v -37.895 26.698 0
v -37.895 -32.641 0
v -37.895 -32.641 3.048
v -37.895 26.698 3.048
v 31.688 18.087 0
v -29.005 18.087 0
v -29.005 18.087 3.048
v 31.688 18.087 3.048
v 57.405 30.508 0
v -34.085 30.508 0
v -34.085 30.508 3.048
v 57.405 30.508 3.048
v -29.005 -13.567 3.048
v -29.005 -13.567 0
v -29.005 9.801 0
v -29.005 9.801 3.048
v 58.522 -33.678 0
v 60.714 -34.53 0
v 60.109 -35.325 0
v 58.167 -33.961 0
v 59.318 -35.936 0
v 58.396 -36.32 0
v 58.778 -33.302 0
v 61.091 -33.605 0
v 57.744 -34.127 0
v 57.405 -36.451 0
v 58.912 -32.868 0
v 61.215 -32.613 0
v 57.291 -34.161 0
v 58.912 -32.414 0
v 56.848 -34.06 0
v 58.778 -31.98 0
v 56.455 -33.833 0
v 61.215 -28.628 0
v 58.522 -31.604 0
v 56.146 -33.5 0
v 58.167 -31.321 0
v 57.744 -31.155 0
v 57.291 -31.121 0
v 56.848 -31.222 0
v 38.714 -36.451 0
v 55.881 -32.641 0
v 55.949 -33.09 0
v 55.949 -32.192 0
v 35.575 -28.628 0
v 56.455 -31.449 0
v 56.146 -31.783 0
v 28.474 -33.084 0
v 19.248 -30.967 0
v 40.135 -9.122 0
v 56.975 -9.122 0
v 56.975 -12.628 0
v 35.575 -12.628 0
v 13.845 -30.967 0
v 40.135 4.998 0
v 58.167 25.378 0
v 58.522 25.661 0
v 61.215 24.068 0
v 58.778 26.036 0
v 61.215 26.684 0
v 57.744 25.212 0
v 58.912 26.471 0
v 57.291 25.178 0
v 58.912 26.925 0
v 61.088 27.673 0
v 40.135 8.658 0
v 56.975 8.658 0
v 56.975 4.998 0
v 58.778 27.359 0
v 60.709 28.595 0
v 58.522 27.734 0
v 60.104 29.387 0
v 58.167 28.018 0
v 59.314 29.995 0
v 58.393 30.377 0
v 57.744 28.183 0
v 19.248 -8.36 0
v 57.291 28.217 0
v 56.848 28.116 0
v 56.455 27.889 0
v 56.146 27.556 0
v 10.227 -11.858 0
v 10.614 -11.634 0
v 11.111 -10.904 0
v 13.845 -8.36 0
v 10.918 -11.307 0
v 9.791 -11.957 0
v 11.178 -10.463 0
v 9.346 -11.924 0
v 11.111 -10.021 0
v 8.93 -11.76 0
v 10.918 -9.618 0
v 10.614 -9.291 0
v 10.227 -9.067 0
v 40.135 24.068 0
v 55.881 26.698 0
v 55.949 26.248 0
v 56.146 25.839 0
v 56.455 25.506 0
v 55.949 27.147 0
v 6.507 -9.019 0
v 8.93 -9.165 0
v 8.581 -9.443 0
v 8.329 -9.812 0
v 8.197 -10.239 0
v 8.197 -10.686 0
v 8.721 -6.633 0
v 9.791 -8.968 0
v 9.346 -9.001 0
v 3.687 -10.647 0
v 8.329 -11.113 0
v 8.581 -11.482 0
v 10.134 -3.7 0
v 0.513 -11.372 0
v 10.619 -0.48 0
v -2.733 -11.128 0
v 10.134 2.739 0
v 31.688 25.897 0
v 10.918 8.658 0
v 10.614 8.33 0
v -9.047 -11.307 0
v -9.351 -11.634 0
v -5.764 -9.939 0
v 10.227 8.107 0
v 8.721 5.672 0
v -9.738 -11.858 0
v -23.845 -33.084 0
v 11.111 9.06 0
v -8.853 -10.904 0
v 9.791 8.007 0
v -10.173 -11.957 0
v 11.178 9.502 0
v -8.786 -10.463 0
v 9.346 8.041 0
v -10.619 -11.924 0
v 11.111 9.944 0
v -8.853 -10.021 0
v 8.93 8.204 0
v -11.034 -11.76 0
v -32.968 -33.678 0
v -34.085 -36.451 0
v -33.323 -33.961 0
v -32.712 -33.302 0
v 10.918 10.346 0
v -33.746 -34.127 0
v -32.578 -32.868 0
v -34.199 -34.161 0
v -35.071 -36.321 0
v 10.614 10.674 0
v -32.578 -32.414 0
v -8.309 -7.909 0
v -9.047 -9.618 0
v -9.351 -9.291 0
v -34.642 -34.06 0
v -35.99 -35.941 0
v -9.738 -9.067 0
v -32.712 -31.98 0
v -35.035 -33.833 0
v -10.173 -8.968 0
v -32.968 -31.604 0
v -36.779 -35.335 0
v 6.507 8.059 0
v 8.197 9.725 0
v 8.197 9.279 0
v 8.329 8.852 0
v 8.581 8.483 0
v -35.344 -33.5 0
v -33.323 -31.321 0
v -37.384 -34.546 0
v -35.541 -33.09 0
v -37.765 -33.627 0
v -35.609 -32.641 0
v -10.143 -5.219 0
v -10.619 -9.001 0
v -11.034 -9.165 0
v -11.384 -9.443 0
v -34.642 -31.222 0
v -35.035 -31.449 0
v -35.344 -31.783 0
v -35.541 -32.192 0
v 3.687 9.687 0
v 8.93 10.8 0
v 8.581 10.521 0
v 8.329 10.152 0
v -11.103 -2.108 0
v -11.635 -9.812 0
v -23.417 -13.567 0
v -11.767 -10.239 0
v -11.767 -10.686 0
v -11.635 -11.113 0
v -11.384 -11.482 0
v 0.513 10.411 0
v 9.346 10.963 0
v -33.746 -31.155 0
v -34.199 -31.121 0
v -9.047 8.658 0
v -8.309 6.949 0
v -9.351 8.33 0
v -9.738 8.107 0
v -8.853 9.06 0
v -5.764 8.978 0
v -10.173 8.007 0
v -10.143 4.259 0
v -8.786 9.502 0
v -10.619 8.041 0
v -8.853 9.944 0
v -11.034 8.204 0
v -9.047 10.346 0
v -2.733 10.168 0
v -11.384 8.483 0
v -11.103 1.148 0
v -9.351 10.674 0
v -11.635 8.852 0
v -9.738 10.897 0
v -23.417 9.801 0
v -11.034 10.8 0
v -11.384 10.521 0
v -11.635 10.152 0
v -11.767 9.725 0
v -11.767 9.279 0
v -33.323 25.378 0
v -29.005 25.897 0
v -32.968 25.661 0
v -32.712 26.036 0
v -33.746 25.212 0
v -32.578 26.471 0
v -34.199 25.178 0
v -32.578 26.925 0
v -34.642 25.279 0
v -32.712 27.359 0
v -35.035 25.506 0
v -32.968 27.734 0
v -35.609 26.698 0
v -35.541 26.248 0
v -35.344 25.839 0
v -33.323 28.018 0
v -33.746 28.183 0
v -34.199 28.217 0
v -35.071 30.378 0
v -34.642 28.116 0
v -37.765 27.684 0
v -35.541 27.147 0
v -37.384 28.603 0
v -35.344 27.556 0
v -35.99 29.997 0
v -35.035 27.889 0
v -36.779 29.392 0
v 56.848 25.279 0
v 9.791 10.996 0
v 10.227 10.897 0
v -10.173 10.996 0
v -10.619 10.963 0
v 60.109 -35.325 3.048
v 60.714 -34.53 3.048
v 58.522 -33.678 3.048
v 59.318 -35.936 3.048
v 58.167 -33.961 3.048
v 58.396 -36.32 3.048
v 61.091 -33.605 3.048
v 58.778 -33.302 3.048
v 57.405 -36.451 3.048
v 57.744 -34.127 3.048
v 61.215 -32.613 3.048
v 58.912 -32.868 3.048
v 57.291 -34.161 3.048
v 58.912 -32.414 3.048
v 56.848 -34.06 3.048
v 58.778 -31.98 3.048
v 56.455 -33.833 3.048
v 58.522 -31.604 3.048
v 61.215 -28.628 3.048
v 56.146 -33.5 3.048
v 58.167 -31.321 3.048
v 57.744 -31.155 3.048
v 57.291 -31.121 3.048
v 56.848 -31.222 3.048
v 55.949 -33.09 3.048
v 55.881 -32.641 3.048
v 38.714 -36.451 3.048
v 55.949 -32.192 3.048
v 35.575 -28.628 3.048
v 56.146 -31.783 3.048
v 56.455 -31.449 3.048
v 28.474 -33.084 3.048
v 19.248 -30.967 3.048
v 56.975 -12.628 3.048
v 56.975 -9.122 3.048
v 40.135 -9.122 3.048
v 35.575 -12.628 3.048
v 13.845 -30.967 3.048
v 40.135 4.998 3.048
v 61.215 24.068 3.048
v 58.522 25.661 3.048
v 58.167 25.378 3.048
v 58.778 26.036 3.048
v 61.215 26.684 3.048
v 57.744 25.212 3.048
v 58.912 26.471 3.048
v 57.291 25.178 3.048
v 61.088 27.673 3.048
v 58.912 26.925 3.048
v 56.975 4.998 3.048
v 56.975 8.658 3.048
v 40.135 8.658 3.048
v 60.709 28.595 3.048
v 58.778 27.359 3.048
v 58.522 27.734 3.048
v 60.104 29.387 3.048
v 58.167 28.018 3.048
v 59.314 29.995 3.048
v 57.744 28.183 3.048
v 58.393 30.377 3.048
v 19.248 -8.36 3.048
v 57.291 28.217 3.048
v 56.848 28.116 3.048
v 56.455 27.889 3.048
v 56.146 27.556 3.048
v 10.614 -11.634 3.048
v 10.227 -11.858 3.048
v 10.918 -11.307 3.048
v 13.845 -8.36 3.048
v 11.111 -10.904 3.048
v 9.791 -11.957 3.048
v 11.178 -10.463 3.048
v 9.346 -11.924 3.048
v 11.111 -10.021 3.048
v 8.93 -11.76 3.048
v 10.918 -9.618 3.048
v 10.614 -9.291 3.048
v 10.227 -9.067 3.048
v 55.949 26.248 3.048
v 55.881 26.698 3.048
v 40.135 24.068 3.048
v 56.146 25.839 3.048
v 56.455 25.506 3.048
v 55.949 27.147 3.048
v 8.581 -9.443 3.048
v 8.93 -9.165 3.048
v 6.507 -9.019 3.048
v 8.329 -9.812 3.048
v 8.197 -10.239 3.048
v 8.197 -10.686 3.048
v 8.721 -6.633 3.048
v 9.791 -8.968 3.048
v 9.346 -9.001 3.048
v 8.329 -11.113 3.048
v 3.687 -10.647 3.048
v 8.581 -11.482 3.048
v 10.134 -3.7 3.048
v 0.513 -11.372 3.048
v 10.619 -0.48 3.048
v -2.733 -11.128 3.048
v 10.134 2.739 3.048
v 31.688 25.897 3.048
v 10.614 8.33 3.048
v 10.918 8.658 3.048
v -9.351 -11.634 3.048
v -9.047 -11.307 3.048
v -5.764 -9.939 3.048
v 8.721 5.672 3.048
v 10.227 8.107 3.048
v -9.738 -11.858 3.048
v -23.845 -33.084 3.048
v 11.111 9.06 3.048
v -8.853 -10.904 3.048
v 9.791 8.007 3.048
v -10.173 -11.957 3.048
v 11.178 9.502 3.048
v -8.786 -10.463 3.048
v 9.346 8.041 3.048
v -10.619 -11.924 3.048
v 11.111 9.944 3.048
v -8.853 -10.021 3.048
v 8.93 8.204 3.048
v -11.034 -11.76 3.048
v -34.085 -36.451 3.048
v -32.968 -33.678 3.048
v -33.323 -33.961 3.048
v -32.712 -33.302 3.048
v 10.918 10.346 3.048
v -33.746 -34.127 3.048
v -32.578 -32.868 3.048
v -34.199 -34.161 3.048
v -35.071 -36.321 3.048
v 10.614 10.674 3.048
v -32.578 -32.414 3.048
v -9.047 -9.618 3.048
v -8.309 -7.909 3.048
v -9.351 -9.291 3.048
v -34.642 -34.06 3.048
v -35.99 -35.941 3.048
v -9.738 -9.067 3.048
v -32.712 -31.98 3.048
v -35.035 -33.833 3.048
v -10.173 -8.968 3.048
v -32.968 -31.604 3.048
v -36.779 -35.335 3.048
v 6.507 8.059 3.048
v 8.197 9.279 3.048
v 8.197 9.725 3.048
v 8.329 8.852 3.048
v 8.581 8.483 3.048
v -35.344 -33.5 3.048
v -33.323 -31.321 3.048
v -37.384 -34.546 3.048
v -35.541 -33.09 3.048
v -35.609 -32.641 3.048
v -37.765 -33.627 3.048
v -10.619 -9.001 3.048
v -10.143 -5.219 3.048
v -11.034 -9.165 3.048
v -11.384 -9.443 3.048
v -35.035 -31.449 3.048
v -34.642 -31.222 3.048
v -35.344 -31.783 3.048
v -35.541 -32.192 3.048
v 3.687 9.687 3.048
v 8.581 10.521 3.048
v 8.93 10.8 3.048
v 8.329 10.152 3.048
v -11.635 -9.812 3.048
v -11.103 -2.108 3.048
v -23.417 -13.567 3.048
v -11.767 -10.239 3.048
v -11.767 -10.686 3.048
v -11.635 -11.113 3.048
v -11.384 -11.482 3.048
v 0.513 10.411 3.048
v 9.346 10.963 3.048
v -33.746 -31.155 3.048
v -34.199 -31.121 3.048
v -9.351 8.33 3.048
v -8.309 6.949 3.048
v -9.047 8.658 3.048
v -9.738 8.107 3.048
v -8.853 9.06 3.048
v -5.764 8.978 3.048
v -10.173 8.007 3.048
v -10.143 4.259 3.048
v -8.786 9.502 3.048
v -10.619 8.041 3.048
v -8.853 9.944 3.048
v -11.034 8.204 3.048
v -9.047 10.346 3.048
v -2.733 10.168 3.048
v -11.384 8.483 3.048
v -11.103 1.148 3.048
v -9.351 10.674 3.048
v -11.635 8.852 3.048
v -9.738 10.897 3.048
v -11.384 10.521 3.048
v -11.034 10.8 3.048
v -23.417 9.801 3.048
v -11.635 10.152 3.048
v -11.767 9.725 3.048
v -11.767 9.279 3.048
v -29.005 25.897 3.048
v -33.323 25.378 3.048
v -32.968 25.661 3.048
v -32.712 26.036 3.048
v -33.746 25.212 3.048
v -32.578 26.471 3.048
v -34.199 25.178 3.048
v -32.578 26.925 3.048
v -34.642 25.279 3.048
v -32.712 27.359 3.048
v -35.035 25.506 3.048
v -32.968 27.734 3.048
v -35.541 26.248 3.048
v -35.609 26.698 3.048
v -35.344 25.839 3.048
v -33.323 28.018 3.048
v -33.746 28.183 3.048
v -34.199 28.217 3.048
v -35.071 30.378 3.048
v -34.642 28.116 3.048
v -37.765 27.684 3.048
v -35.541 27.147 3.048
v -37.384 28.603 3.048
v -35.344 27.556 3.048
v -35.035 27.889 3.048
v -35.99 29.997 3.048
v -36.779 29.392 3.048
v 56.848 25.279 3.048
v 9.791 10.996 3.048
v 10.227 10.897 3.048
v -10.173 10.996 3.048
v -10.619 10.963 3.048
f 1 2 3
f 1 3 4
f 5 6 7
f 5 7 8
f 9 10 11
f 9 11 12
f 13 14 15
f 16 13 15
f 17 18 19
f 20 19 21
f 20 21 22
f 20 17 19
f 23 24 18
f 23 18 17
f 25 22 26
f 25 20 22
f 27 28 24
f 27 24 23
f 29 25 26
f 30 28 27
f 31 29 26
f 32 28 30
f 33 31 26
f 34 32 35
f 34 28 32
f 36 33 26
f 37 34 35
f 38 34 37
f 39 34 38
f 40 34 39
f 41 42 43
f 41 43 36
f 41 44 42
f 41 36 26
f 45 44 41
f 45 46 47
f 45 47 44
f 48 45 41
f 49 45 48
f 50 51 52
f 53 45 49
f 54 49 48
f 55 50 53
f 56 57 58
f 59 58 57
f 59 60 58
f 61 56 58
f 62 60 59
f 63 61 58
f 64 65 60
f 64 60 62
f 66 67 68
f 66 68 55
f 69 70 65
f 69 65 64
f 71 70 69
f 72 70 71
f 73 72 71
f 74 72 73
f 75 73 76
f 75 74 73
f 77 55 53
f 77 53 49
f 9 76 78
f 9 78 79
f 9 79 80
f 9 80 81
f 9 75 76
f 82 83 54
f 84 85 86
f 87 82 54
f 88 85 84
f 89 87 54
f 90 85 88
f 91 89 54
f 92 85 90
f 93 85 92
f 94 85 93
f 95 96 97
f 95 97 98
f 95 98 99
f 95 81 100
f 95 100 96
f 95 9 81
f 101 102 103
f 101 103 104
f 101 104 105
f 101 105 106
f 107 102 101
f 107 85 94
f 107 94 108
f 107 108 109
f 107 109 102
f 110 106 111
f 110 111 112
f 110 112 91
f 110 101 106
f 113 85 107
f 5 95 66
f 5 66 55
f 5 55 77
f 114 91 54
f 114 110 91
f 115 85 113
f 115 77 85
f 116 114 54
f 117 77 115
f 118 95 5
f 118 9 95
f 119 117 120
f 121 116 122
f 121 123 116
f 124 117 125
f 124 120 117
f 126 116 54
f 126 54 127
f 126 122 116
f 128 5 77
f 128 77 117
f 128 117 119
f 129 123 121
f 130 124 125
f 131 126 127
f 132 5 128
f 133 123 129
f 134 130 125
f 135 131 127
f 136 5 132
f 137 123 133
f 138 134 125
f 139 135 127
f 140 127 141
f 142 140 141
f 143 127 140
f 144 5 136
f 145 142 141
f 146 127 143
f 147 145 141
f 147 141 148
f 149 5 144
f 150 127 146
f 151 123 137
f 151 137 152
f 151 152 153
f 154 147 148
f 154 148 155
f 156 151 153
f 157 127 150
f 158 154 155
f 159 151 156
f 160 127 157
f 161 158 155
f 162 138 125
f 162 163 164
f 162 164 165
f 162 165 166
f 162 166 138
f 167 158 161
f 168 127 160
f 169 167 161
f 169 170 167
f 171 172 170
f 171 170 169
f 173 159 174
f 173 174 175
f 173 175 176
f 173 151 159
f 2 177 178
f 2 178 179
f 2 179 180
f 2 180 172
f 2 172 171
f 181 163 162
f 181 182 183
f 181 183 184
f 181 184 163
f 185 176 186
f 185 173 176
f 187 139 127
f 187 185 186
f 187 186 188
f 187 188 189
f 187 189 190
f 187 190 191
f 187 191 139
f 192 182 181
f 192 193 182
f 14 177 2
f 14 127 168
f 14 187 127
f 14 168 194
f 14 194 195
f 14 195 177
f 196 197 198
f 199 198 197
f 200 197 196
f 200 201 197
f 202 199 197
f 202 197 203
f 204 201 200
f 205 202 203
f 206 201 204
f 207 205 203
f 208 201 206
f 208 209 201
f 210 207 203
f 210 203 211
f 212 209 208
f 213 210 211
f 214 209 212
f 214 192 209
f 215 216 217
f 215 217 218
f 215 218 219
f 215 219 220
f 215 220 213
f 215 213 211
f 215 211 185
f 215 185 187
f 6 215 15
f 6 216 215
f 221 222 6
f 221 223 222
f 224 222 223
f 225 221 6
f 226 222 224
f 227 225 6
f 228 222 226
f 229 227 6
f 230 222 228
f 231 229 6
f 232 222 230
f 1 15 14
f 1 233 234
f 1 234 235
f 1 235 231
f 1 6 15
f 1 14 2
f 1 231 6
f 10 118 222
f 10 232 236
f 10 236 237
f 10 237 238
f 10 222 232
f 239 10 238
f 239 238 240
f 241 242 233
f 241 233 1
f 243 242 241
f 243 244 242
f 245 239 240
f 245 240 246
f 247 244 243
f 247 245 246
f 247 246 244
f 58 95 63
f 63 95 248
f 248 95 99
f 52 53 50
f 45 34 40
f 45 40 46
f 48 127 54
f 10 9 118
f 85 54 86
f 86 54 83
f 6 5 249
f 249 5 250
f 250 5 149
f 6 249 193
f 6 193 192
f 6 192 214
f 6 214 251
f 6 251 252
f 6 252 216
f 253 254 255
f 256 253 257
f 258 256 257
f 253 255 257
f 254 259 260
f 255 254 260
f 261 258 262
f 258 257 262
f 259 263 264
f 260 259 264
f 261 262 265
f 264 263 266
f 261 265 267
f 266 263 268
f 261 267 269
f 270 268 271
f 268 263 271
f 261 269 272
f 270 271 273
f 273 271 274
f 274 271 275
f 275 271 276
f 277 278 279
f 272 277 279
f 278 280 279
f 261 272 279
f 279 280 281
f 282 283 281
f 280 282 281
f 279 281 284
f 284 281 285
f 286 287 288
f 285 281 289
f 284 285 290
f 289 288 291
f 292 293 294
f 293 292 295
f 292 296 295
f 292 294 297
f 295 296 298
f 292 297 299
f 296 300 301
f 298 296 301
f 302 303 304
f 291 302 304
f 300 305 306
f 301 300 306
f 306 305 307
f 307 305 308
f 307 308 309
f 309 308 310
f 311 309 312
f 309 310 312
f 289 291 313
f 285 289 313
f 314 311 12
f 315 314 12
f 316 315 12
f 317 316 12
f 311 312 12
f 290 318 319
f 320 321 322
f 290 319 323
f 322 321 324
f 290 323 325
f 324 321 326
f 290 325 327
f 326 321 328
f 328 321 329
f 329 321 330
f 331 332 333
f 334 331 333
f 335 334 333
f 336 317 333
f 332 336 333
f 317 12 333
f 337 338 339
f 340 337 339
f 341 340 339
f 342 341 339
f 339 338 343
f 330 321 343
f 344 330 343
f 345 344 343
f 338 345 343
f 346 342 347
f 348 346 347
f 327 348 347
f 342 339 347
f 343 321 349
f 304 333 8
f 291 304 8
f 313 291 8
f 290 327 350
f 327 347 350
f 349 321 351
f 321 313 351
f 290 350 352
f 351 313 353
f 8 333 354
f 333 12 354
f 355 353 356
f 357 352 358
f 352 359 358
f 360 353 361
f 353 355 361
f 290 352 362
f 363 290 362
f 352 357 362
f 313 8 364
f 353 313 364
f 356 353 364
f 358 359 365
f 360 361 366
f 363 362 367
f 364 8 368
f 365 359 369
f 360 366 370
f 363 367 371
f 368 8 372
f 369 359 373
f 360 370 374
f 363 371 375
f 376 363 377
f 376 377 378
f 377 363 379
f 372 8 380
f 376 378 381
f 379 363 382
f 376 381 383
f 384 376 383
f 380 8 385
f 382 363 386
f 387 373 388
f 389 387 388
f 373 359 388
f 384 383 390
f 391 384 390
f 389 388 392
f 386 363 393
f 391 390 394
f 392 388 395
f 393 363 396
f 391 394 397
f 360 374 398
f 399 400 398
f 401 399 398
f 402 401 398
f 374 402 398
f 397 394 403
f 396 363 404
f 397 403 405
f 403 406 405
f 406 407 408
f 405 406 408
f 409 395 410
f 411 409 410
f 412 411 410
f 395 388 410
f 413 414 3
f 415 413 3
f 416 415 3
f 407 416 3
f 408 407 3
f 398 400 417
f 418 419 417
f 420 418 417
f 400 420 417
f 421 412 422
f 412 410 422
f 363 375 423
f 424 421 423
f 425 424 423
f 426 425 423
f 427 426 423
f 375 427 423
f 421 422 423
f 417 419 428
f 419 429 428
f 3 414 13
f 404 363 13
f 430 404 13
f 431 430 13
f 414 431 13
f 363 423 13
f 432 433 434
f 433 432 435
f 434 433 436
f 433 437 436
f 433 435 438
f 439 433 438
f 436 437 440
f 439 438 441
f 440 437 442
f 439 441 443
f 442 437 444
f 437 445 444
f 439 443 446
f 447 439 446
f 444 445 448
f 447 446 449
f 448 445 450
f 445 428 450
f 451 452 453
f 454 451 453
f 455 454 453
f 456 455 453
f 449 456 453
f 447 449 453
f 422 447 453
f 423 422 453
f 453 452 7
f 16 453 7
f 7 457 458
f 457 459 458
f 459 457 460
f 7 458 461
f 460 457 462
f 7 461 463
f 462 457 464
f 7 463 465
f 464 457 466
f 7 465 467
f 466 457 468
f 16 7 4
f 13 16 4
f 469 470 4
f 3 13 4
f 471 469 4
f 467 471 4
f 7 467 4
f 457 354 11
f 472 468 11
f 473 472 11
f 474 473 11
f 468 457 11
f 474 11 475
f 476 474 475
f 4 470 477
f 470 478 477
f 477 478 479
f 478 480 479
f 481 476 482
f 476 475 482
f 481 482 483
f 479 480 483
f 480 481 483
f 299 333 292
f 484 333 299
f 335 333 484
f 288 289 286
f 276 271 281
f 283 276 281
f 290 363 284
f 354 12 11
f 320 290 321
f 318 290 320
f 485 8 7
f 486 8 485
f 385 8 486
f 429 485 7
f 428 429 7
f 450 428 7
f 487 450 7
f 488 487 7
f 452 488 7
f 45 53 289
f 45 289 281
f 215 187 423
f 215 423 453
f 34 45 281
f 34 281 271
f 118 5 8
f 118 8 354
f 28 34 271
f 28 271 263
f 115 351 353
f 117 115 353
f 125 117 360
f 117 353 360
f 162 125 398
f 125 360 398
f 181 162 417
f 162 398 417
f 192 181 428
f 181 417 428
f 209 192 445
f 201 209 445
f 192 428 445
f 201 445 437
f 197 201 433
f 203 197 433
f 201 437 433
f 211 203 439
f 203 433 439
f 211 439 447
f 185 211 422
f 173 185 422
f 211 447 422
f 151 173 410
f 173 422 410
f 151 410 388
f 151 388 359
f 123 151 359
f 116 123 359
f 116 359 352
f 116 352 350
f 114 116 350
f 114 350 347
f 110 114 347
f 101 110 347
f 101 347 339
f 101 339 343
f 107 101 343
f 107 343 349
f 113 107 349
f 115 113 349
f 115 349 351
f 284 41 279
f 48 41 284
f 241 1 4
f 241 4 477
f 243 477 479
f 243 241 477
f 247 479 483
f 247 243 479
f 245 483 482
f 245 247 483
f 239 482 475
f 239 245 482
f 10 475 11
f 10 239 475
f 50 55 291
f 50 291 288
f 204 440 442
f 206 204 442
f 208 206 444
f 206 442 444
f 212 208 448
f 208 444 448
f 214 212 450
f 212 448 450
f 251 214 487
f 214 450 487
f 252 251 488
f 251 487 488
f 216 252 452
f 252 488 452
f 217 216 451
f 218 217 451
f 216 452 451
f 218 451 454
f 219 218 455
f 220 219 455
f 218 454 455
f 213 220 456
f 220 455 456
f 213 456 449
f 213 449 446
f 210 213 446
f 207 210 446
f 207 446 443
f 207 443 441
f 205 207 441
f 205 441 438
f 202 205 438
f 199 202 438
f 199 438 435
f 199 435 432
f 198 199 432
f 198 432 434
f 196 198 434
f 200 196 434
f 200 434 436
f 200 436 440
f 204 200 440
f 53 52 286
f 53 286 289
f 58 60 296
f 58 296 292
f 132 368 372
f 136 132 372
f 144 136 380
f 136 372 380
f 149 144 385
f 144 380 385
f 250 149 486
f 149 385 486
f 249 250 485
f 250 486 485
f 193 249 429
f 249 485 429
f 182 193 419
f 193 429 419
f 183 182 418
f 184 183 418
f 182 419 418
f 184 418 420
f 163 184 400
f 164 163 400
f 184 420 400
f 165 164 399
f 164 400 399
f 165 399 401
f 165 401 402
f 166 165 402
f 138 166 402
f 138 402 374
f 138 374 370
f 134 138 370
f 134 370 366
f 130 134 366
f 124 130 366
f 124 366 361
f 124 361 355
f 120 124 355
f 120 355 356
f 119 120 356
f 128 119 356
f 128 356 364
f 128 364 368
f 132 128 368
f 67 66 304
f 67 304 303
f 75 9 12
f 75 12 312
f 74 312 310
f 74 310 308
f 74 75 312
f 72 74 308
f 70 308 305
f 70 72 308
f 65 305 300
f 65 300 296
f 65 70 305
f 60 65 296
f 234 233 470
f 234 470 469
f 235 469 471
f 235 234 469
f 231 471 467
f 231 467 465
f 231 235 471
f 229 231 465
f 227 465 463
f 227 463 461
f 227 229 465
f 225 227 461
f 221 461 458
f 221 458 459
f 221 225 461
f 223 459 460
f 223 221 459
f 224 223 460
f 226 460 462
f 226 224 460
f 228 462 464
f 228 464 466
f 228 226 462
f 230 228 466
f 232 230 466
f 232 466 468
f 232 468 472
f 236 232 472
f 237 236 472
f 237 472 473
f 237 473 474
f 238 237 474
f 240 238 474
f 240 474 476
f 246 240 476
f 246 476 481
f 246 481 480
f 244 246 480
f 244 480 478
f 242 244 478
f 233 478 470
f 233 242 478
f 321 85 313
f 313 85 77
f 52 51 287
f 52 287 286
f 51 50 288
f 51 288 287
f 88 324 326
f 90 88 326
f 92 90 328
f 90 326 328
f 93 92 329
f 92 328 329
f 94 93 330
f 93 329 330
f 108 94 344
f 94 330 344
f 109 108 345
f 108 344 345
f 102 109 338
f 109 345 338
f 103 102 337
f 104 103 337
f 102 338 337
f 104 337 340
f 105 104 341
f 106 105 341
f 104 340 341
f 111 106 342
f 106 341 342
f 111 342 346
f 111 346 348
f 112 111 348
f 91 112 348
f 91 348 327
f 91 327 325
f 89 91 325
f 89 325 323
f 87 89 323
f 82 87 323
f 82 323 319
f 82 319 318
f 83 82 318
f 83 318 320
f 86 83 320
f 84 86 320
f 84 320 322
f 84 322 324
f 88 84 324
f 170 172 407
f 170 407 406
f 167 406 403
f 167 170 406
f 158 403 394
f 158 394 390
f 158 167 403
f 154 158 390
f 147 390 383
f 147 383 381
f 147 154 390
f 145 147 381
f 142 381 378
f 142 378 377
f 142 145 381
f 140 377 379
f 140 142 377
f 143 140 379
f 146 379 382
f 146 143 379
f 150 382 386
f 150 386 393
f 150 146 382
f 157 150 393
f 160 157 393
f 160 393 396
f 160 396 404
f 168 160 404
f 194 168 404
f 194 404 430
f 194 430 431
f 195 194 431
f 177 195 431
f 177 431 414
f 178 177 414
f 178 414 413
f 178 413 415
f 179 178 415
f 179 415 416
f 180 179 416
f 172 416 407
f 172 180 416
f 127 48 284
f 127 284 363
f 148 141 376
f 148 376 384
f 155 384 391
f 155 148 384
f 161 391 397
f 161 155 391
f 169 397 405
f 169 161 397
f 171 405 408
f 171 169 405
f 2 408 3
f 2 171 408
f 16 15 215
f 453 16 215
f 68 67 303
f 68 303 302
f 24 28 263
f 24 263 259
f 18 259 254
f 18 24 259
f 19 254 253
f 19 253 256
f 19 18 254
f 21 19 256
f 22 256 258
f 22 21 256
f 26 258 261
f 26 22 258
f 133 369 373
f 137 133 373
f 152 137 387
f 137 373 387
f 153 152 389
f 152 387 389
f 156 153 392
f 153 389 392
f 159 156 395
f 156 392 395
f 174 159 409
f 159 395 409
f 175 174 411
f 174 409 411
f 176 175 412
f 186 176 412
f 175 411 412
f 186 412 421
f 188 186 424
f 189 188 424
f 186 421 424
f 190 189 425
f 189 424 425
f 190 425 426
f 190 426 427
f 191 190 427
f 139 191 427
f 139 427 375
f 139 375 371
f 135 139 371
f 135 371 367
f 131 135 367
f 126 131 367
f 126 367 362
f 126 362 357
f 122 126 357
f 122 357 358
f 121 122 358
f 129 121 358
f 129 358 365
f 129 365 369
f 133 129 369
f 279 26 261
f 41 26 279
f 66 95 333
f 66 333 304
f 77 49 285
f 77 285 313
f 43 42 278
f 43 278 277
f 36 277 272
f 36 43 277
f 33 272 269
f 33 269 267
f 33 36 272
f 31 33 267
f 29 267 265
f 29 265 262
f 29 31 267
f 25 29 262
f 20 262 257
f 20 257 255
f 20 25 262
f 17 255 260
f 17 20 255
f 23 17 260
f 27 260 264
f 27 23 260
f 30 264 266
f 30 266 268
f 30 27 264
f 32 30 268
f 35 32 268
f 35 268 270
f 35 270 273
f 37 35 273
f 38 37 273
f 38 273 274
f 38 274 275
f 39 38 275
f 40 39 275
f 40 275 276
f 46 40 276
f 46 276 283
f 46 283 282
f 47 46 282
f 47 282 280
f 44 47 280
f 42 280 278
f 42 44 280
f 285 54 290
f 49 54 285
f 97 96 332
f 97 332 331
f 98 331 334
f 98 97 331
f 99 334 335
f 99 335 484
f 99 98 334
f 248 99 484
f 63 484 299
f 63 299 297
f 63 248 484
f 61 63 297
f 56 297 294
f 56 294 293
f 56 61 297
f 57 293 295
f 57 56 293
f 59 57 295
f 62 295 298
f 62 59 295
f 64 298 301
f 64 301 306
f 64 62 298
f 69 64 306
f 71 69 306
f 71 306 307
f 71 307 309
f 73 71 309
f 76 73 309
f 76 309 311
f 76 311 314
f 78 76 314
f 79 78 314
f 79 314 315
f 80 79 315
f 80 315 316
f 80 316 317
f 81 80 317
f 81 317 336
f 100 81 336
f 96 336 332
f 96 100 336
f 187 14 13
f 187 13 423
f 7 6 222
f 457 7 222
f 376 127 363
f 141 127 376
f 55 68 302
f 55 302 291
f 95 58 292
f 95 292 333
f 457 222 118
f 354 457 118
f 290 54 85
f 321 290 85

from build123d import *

# Parameters (mm, degrees)
SKETCH1_R           = 1.524
SKETCH1_W           = 60.6932
SKETCH1_H           = 7.81
SKETCH1_W_2         = 5.588
SKETCH1_H_2         = 23.368
SKETCH1_W_3         = 5.4034
SKETCH1_H_3         = 22.6066
BOSS_EXTRUDE1_DEPTH = 3.048
SKETCH2_R           = 10.922
SKETCH2_R_2         = 1.4986
CUT_EXTRUDE1_DEPTH  = 72.310891511


with BuildPart() as part:
    # Sketch1 → Boss-Extrude1 (new body)
    with BuildSketch(Plane.XY):
        with BuildLine():
            Line((61.214907375, 24.068294304), (40.134807375, 24.068294304))
            Line((40.134807375, 24.068294304), (40.134807375, 8.658194304))
            Line((40.134807375, 8.658194304), (56.975007375, 8.658194304))
            Line((56.975007375, 8.658194304), (56.975007375, 4.997894304))
            Line((56.975007375, 4.997894304), (40.134807375, 4.997894304))
            Line((40.134807375, 4.997894304), (40.134807375, -9.121805696))
            Line((40.134807375, -9.121805696), (56.975007375, -9.121805696))
            Line((56.975007375, -9.121805696), (56.975007375, -12.628005696))
            Line((56.975007375, -12.628005696), (35.575007375, -12.628005696))
            Line((35.575007375, -12.628005696), (35.575007375, -28.627805696))
            Line((35.575007375, -28.627805696), (61.214907375, -28.627805696))
            Line((61.214907375, -28.627805696), (61.214907375, -32.613401529))
            ThreePointArc((61.214907375, -32.613401529), (60.108826144, -35.325305244), (57.405007375, -36.451005696))
            Line((57.405007375, -36.451005696), (38.714307375, -36.451005696))
            Line((38.714307375, -36.451005696), (28.474307375, -33.084405696))
            Line((28.474307375, -33.084405696), (-23.844892625, -33.084405696))
            Line((-23.844892625, -33.084405696), (-34.084892625, -36.451005696))
            ThreePointArc((-34.084892625, -36.451005696), (-36.778969461, -35.335082532), (-37.894892625, -32.641005696))
            Line((-37.894892625, -32.641005696), (-37.894892625, 26.697694304))
            ThreePointArc((-37.894892625, 26.697694304), (-36.778969461, 29.391771141), (-34.084892625, 30.507694304))
            Line((-34.084892625, 30.507694304), (57.404932375, 30.507694304))
            ThreePointArc((57.404932375, 30.507694304), (60.103884597, 29.386886916), (61.214907375, 26.683892153))
            Line((61.214907375, 26.683892153), (61.214907375, 24.068294304))
        make_face()
        with Locations(Location((57.405007375, -32.641005696, 0), (0, 0, 180))):
            Circle(SKETCH1_R, mode=Mode.SUBTRACT)
        with Locations(Location((-34.084892625, -32.641005696, 0), (0, 0, 180))):
            Circle(SKETCH1_R, mode=Mode.SUBTRACT)
        with Locations(Location((-34.084892625, 26.697694304, 0), (0, 0, 180))):
            Circle(SKETCH1_R, mode=Mode.SUBTRACT)
        with Locations(Location((57.404932375, 26.697694304, 0), (0, 0, 180))):
            Circle(SKETCH1_R, mode=Mode.SUBTRACT)
        with Locations((1.341707375, 21.991994304)):
            Rectangle(SKETCH1_W, SKETCH1_H, mode=Mode.SUBTRACT)
        with Locations((-26.210892625, -1.882805696)):
            Rectangle(SKETCH1_W_2, SKETCH1_H_2, mode=Mode.SUBTRACT)
        with Locations((16.546707375, -19.663505696)):
            Rectangle(SKETCH1_W_3, SKETCH1_H_3, mode=Mode.SUBTRACT)
    extrude(amount=BOSS_EXTRUDE1_DEPTH)

    # Sketch2 → Cut-Extrude1 (cut, through all)
    with BuildSketch(Plane.XY.offset(3.048)):
        with Locations((-0.302892625, -0.480305696)):
            Circle(SKETCH2_R)
        with Locations((-10.285092625, -10.462505696)):
            Circle(SKETCH2_R_2)
        with Locations((-10.285092625, 9.501894304)):
            Circle(SKETCH2_R_2)
        with Locations((9.679307375, -10.462505696)):
            Circle(SKETCH2_R_2)
        with Locations((9.679307375, 9.501894304)):
            Circle(SKETCH2_R_2)
    extrude(amount=-CUT_EXTRUDE1_DEPTH, mode=Mode.SUBTRACT)


solid = part.part
